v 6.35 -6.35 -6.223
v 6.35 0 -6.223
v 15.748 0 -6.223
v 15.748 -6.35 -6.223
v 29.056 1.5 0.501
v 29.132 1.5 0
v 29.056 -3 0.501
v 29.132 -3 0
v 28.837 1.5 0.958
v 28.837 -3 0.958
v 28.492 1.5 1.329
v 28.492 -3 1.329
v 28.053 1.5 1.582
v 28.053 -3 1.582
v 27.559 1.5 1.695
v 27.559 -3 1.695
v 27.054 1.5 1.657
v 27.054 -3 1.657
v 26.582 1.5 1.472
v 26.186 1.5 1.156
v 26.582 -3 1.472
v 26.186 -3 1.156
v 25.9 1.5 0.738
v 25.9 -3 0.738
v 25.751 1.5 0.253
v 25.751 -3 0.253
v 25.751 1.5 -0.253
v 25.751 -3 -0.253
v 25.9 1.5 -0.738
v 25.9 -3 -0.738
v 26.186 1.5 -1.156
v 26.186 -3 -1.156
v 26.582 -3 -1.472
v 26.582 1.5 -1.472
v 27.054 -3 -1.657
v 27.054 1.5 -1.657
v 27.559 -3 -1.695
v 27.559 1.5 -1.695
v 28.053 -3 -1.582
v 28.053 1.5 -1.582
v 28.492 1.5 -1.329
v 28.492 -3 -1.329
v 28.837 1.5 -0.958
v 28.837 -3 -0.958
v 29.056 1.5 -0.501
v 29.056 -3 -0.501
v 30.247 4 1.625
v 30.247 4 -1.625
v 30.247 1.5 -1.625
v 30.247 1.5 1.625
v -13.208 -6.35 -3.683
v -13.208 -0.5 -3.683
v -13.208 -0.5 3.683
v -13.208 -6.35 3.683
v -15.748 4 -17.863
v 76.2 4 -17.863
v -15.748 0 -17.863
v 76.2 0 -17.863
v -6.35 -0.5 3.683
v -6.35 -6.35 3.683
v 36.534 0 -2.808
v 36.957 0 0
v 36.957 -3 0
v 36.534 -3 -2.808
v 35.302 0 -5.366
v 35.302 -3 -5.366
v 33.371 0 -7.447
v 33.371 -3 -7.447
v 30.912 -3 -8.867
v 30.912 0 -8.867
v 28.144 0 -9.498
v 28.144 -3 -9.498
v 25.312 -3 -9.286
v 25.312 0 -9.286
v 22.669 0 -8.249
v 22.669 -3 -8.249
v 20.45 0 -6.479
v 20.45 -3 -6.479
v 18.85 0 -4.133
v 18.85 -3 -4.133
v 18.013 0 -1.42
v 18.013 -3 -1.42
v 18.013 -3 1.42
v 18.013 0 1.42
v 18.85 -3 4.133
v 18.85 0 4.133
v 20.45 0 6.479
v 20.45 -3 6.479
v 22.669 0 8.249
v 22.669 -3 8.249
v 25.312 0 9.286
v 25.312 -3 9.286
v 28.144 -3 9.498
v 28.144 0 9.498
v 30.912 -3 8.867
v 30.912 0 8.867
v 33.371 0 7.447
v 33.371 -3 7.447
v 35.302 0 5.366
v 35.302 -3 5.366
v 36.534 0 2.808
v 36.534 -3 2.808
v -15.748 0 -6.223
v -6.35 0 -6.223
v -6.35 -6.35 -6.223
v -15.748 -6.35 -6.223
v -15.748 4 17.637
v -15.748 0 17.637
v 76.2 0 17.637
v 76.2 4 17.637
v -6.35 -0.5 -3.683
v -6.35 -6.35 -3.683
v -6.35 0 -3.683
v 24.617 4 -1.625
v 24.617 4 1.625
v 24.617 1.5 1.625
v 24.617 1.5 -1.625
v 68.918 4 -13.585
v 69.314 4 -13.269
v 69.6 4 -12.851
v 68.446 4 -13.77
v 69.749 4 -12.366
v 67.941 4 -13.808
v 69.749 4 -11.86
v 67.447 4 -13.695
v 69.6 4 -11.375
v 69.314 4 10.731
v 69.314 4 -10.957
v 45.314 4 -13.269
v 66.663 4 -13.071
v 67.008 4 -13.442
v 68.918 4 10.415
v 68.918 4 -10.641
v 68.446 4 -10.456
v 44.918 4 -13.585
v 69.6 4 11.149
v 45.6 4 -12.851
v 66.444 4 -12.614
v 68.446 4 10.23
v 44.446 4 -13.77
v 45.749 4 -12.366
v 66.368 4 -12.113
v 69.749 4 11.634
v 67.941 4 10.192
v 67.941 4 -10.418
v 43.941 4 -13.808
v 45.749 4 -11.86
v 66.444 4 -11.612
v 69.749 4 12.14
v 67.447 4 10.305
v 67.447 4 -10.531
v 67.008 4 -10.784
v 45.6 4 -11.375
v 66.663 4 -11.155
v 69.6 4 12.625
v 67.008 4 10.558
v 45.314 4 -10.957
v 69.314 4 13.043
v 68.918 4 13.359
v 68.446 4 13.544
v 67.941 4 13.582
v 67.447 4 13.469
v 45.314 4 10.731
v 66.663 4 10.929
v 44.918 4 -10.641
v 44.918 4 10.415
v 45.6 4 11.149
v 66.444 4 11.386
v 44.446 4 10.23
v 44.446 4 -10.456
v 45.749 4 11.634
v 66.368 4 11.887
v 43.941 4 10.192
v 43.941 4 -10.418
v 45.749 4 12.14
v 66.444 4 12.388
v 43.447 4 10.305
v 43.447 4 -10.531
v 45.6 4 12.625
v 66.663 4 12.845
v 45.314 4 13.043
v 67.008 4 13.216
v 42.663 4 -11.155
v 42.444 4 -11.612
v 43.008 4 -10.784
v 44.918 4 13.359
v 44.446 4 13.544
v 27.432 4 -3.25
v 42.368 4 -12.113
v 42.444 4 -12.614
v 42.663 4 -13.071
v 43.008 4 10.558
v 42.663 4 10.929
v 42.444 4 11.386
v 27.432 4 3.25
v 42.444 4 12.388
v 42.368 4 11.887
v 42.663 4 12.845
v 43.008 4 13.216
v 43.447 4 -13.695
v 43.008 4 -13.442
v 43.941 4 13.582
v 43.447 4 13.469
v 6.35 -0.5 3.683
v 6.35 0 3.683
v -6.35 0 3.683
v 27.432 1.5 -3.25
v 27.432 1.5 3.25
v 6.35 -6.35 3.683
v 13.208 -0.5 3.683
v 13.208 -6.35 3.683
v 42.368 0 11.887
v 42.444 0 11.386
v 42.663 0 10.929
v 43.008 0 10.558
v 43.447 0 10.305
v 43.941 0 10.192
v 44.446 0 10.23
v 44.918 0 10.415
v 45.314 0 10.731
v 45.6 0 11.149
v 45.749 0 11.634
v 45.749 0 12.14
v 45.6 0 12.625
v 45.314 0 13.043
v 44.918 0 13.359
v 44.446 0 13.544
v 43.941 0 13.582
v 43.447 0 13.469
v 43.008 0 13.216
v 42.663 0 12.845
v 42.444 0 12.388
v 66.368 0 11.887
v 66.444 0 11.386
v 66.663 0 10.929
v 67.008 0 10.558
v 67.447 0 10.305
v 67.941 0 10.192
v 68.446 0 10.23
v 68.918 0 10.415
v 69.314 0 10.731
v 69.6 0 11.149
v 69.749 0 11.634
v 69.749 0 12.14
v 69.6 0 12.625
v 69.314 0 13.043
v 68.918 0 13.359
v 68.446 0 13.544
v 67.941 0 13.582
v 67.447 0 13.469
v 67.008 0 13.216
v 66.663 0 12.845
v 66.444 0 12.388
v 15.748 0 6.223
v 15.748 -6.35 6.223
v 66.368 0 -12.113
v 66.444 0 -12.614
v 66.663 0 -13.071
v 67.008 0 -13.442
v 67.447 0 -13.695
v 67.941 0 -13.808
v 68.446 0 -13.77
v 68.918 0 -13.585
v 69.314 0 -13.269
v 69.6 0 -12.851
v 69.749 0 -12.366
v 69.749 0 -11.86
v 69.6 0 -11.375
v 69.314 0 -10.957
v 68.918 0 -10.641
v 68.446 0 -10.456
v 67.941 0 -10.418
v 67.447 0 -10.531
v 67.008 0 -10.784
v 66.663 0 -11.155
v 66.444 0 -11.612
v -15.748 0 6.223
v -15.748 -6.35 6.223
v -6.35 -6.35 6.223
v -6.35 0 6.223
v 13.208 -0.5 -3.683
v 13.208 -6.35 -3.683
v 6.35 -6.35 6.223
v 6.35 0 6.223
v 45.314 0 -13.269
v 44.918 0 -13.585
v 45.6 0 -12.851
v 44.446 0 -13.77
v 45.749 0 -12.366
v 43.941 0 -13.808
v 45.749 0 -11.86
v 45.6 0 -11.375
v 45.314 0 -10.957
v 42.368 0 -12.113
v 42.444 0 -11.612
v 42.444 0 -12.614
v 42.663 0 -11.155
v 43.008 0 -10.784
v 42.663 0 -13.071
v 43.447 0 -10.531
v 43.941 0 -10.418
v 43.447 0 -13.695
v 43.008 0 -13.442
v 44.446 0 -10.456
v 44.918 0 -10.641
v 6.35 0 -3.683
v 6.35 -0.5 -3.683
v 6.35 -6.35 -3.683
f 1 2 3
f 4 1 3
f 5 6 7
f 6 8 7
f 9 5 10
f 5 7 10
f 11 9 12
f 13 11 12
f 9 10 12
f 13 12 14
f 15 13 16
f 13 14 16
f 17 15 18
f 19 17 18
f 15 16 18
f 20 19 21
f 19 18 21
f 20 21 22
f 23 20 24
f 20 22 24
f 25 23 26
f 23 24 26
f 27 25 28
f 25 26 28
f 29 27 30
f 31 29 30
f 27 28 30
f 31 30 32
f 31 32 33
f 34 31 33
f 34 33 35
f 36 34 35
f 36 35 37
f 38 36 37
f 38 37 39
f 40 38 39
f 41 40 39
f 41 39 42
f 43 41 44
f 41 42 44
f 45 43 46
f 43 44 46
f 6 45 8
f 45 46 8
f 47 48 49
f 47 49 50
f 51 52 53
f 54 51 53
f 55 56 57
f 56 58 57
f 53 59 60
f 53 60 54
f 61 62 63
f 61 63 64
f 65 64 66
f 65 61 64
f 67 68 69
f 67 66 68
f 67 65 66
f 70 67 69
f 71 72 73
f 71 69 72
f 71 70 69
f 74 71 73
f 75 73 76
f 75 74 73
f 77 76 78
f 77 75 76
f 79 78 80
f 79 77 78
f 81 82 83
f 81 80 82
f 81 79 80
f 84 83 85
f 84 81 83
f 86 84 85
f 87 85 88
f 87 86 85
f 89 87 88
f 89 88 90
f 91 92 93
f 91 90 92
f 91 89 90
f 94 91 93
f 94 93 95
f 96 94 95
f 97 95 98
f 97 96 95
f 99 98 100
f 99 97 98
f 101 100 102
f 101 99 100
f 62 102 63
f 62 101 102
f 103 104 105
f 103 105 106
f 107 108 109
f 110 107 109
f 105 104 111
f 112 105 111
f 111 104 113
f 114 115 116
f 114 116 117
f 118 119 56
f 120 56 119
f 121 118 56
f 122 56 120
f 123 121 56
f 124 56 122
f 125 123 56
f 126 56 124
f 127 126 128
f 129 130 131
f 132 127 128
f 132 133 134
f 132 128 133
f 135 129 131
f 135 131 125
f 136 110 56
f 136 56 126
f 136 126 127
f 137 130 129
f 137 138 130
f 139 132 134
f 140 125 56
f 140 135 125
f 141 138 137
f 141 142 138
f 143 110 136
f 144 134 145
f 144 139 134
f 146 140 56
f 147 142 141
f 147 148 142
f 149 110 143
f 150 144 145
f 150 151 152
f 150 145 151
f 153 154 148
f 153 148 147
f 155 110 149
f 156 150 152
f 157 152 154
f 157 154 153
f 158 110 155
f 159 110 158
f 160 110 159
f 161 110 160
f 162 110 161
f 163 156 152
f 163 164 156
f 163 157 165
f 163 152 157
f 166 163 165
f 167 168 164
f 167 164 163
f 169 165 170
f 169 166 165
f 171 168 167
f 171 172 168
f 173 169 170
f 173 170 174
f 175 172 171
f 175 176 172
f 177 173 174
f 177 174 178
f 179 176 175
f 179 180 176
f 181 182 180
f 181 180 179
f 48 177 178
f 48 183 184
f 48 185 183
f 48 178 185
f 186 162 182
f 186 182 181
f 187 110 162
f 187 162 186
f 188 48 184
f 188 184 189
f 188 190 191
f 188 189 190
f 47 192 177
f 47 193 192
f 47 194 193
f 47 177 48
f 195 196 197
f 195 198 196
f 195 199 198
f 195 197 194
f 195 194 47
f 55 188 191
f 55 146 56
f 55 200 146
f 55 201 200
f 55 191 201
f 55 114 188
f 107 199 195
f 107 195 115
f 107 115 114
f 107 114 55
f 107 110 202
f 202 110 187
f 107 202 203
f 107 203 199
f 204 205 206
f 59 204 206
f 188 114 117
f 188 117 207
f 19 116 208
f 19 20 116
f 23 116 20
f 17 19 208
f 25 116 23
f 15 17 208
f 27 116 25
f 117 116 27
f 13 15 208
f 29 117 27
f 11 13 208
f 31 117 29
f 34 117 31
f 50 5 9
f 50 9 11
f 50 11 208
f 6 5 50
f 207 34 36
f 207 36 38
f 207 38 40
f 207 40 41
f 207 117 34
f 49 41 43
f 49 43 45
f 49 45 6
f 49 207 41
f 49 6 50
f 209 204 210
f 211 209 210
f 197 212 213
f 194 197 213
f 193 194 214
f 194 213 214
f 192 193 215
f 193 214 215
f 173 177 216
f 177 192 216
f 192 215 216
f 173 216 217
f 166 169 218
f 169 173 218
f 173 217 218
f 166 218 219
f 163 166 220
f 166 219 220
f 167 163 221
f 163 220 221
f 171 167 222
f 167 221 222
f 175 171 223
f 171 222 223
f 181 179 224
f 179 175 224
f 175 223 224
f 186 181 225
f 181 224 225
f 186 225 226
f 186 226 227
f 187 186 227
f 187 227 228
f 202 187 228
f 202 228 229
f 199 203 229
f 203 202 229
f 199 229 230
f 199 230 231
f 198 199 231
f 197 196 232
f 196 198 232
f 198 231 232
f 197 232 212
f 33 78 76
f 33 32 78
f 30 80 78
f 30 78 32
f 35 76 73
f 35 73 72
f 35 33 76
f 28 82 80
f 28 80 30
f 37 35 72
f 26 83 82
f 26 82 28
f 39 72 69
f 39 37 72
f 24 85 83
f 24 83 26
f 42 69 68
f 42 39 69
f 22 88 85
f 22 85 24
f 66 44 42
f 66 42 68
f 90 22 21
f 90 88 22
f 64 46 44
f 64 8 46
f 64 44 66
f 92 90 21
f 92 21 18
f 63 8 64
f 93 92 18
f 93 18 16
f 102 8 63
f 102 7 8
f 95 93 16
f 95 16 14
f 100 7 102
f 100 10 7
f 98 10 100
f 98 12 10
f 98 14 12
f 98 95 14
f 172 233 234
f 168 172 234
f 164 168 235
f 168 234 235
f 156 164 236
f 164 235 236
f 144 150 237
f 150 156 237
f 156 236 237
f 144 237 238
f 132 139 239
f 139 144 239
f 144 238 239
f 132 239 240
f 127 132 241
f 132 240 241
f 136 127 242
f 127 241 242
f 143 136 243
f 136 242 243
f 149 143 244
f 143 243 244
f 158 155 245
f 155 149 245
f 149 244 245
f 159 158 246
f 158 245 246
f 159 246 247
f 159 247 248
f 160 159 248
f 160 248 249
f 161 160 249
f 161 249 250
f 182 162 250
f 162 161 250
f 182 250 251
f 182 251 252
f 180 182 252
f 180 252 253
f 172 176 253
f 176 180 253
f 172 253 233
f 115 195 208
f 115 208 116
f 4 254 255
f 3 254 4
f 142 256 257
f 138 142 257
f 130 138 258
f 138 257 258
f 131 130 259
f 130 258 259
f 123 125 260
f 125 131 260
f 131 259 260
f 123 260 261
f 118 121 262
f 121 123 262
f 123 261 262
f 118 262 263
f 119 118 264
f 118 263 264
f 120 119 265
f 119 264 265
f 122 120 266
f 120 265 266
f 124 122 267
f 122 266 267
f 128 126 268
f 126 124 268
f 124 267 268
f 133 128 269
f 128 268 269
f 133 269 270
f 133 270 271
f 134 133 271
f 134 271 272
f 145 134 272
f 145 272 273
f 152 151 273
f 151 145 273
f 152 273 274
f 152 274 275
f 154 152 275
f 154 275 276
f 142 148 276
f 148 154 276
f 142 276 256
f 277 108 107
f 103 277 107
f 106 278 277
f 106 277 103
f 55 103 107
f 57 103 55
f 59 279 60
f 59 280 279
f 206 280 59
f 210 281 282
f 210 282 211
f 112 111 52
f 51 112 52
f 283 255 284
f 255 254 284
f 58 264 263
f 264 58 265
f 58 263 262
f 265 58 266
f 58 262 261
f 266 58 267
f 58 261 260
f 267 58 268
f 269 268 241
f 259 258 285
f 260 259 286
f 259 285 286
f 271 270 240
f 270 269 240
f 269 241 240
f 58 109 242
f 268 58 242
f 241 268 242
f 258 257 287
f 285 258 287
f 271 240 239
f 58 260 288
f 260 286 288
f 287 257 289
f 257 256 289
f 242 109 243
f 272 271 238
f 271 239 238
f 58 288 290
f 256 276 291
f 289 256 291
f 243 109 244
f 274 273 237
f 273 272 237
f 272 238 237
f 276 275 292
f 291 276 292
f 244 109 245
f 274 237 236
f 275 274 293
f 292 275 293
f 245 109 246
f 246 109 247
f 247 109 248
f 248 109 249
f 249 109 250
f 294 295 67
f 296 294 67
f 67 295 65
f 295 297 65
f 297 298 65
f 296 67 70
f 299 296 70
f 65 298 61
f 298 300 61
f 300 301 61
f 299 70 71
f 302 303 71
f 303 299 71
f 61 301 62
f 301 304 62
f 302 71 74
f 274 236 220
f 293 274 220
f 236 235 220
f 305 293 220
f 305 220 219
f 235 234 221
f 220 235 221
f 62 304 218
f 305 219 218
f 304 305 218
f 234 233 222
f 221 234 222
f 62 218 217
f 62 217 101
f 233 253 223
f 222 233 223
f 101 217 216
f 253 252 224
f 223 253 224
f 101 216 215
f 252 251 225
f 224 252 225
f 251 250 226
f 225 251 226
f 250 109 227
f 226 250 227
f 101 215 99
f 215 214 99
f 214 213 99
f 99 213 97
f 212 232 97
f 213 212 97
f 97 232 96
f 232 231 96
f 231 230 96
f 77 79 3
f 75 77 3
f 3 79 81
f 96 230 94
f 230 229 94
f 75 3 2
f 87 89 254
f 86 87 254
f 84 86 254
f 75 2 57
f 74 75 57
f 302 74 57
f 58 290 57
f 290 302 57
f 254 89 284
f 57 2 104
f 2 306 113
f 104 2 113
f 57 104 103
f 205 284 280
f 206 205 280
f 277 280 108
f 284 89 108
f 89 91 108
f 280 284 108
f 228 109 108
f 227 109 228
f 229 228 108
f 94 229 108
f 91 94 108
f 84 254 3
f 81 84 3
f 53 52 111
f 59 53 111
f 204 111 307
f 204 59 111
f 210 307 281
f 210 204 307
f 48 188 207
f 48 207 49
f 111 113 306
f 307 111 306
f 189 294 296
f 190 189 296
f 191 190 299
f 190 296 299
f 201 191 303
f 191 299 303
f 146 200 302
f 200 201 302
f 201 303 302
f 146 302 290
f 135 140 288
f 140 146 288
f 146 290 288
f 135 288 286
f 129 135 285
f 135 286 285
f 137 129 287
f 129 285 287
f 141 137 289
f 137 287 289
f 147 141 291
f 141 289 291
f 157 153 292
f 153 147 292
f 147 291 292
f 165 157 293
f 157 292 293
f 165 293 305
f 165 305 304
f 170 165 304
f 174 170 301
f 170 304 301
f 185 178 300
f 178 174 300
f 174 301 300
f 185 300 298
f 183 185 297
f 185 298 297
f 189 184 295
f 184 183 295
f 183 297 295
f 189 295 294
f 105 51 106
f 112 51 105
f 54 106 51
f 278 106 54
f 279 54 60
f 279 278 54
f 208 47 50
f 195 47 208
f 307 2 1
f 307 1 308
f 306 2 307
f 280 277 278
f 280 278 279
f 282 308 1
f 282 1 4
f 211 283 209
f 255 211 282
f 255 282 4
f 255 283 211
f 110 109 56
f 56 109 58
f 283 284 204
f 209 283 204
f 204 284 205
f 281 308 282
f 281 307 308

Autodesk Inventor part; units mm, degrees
ref_plane "YZ Plane" through (0, 0, 0) normal (1, 0, 0) x (0, 1, 0)
ref_plane "XZ Plane" through (0, 0, 0) normal (0, 1, 0) x (-1, 0, 0)
ref_plane "XY Plane" through (0, 0, 0) normal (0, 0, 1) x (1, 0, 0)
sketch "Sketch1" plane through (0, 0, 0) normal (0, 1, 0) x (-1, 0, 0)
  line L0 (0, 17.637) -> (-76.2, 17.637)
  line L1 (-76.2, 17.637) -> (-76.2, -17.863)
  line L2 (-76.2, -17.863) -> (0, -17.863)
  line L3 (0, -17.863) -> (0, 17.637)
  line L4 (0, 17.637) -> (15.748, 17.637)
  line L5 (15.748, 17.637) -> (15.748, -17.863)
  line L6 (15.748, -17.863) -> (0, -17.863)
  line L7 (0, -17.863) -> (0, 17.637)
  circle A0 centre (-44.068, -12.113) radius 1.7
  circle A1 centre (-68.068, -12.113) radius 1.7
  circle A2 centre (-44.068, 11.887) radius 1.7
  circle A3 centre (-68.068, 11.887) radius 1.7
  point P0 (0, 0)
  dimension "d0" = 76.2
  dimension "d1" = 35.5
  dimension "d2" = 17.637
  dimension "d3" = 15.748
  dimension "d45" = 3.4
  dimension "d47" = 5.75
  dimension "d50" = 24
  dimension "d53" = 24
  dimension "d58" = 44.068
extrude "Extrusion1" add sketch "Sketch1" along normal blind 4
sketch "Sketch4" plane through (0, 0, 0) normal (0, -1, 0) x (1, 0, 0)
  line L0 (-12.7, 3.175) -> (12.7, 3.175) construction
  line L1 (12.7, 3.175) -> (12.7, -3.175) construction
  line L2 (12.7, -3.175) -> (-12.7, -3.175) construction
  line L3 (-12.7, -3.175) -> (-12.7, 3.175) construction
  line L4 (-6.35, 3.175) -> (-6.35, -3.175) construction
  line L5 (6.35, 3.175) -> (6.35, -3.175) construction
  line L6 (-6.35, 3.683) -> (-13.208, 3.683)
  line L7 (-13.208, 3.683) -> (-13.208, 6.223)
  line L8 (-13.208, 6.223) -> (-6.35, 6.223)
  line L9 (-6.35, 6.223) -> (-6.35, 3.683)
  line L10 (-13.208, 6.223) -> (-15.748, 6.223)
  line L11 (-15.748, 6.223) -> (-15.748, 0)
  line L12 (-15.748, 0) -> (-13.208, 0)
  line L13 (-13.208, 0) -> (-13.208, 6.223)
  line L14 (-12.7, 0) -> (12.7, 0) construction
  line L15 (0, 3.175) -> (0, -3.175) construction
  line L16 (-6.35, -3.683) -> (-13.208, -3.683)
  line L17 (-13.208, -6.223) -> (-6.35, -6.223)
  line L18 (-6.35, -6.223) -> (-6.35, -3.683)
  line L19 (-13.208, -6.223) -> (-15.748, -6.223)
  line L20 (-15.748, -6.223) -> (-15.748, 0)
  line L21 (-13.208, 0) -> (-13.208, -6.223)
  line L22 (6.35, 3.683) -> (13.208, 3.683)
  line L23 (13.208, 3.683) -> (13.208, 6.223)
  line L24 (13.208, 6.223) -> (6.35, 6.223)
  line L25 (6.35, 6.223) -> (6.35, 3.683)
  line L26 (13.208, 6.223) -> (15.748, 6.223)
  line L27 (15.748, 6.223) -> (15.748, 0)
  line L28 (15.748, 0) -> (13.208, 0)
  line L29 (13.208, 0) -> (13.208, 6.223)
  line L30 (6.35, -6.223) -> (6.35, -3.683)
  line L31 (6.35, -3.683) -> (13.208, -3.683)
  line L32 (13.208, -6.223) -> (6.35, -6.223)
  line L33 (13.208, 0) -> (13.208, -6.223)
  line L34 (15.748, -6.223) -> (15.748, 0)
  line L35 (13.208, -6.223) -> (15.748, -6.223)
  point P0 (0, 0)
  dimension "d20" = 25.4
  dimension "d21" = 6.35
  dimension "d22" = 3.175
  dimension "d23" = 12.7
  dimension "d24" = 6.35
  dimension "d25" = 6.35
  dimension "d26" = 6.858
  dimension "d27" = 2.54
  dimension "d28" = 0.508
  dimension "d29" = 2.54
  dimension "d30" = 6.223
extrude "Extrusion5" add sketch "Sketch4" along normal blind 6.35
sketch "Sketch6" plane through (0, 0, 0) normal (0, -1, 0) x (1, 0, 0)
  circle A0 centre (27.432, 0) radius 9.525
  line L0 (0, 24.737) -> (0, -24.963) projected
  point P0 (0, 0)
  dimension "d35" = 19.05
  dimension "d36" = 27.432
extrude "Extrusion7" add sketch "Sketch6" along normal blind 3
sketch "Sketch7" plane through (27.432, -3, 0) normal (0, -1, 0) x (1, 0, 0)
  circle A0 centre (0, 0) radius 1.7
  point P0 (-27.432, 0)
  dimension "d39" = 3.4
extrude "Extrusion8" cut sketch "Sketch7" against normal through all
sketch "Sketch8" plane through (0, 0, 0) normal (0, -1, 0) x (1, 0, 0)
  circle A0 centre (27.432, 0) radius 1.7 construction
  line L0 (27.432, 0) -> (15.875, -6.35) construction
  line L1 (27.432, 0) -> (15.875, 0) construction
  line L2 (6.35, -6.223) -> (6.35, -3.683) construction
  line L3 (27.432, 0) -> (6.35, -6.223) construction
  line L4 (27.432, 0) -> (6.35, 3.6065) construction
  point P0 (0, 0)
sketch "Sketch9" plane through (0, 4, 0) normal (0, 1, 0) x (1, 0, 0)
  circle A0 centre (27.432, 0) radius 1.7 construction
  circle A1 centre (27.432, 0) radius 3.25 construction
  line L0 (27.432, 3.25) -> (30.2466, 1.625)
  line L1 (30.2466, 1.625) -> (30.2466, -1.625)
  line L2 (30.2466, -1.625) -> (27.432, -3.25)
  line L3 (27.432, -3.25) -> (24.6174, -1.625)
  line L4 (24.6174, -1.625) -> (24.6174, 1.625)
  line L5 (24.6174, 1.625) -> (27.432, 3.25)
  point P0 (0, 0)
  dimension "d42" = 6.5
extrude "Extrusion9" cut sketch "Sketch9" against normal blind 2.5
sketch "Sketch10" plane through (0, 0, 0) normal (0, -1, 0) x (1, 0, 0)
  line L0 (-13.208, 3.683) -> (-13.208, -3.683) projected
  line L1 (13.208, 3.683) -> (6.35, 3.683) projected
  line L2 (-13.208, -3.683) -> (13.208, -3.683)
  line L3 (13.208, -3.683) -> (13.208, 3.683)
  line L4 (13.208, 3.683) -> (-13.208, 3.683)
  line L5 (-13.208, 3.683) -> (-13.208, -3.683)
  point P0 (0, 0)
extrude "Extrusion10" add sketch "Sketch10" along normal blind 0.5
equation "\"d22\" = 0.5 * d21"
equation "\"d23\" = 0.5 * d20"
properties part number "capstone hook mount"
